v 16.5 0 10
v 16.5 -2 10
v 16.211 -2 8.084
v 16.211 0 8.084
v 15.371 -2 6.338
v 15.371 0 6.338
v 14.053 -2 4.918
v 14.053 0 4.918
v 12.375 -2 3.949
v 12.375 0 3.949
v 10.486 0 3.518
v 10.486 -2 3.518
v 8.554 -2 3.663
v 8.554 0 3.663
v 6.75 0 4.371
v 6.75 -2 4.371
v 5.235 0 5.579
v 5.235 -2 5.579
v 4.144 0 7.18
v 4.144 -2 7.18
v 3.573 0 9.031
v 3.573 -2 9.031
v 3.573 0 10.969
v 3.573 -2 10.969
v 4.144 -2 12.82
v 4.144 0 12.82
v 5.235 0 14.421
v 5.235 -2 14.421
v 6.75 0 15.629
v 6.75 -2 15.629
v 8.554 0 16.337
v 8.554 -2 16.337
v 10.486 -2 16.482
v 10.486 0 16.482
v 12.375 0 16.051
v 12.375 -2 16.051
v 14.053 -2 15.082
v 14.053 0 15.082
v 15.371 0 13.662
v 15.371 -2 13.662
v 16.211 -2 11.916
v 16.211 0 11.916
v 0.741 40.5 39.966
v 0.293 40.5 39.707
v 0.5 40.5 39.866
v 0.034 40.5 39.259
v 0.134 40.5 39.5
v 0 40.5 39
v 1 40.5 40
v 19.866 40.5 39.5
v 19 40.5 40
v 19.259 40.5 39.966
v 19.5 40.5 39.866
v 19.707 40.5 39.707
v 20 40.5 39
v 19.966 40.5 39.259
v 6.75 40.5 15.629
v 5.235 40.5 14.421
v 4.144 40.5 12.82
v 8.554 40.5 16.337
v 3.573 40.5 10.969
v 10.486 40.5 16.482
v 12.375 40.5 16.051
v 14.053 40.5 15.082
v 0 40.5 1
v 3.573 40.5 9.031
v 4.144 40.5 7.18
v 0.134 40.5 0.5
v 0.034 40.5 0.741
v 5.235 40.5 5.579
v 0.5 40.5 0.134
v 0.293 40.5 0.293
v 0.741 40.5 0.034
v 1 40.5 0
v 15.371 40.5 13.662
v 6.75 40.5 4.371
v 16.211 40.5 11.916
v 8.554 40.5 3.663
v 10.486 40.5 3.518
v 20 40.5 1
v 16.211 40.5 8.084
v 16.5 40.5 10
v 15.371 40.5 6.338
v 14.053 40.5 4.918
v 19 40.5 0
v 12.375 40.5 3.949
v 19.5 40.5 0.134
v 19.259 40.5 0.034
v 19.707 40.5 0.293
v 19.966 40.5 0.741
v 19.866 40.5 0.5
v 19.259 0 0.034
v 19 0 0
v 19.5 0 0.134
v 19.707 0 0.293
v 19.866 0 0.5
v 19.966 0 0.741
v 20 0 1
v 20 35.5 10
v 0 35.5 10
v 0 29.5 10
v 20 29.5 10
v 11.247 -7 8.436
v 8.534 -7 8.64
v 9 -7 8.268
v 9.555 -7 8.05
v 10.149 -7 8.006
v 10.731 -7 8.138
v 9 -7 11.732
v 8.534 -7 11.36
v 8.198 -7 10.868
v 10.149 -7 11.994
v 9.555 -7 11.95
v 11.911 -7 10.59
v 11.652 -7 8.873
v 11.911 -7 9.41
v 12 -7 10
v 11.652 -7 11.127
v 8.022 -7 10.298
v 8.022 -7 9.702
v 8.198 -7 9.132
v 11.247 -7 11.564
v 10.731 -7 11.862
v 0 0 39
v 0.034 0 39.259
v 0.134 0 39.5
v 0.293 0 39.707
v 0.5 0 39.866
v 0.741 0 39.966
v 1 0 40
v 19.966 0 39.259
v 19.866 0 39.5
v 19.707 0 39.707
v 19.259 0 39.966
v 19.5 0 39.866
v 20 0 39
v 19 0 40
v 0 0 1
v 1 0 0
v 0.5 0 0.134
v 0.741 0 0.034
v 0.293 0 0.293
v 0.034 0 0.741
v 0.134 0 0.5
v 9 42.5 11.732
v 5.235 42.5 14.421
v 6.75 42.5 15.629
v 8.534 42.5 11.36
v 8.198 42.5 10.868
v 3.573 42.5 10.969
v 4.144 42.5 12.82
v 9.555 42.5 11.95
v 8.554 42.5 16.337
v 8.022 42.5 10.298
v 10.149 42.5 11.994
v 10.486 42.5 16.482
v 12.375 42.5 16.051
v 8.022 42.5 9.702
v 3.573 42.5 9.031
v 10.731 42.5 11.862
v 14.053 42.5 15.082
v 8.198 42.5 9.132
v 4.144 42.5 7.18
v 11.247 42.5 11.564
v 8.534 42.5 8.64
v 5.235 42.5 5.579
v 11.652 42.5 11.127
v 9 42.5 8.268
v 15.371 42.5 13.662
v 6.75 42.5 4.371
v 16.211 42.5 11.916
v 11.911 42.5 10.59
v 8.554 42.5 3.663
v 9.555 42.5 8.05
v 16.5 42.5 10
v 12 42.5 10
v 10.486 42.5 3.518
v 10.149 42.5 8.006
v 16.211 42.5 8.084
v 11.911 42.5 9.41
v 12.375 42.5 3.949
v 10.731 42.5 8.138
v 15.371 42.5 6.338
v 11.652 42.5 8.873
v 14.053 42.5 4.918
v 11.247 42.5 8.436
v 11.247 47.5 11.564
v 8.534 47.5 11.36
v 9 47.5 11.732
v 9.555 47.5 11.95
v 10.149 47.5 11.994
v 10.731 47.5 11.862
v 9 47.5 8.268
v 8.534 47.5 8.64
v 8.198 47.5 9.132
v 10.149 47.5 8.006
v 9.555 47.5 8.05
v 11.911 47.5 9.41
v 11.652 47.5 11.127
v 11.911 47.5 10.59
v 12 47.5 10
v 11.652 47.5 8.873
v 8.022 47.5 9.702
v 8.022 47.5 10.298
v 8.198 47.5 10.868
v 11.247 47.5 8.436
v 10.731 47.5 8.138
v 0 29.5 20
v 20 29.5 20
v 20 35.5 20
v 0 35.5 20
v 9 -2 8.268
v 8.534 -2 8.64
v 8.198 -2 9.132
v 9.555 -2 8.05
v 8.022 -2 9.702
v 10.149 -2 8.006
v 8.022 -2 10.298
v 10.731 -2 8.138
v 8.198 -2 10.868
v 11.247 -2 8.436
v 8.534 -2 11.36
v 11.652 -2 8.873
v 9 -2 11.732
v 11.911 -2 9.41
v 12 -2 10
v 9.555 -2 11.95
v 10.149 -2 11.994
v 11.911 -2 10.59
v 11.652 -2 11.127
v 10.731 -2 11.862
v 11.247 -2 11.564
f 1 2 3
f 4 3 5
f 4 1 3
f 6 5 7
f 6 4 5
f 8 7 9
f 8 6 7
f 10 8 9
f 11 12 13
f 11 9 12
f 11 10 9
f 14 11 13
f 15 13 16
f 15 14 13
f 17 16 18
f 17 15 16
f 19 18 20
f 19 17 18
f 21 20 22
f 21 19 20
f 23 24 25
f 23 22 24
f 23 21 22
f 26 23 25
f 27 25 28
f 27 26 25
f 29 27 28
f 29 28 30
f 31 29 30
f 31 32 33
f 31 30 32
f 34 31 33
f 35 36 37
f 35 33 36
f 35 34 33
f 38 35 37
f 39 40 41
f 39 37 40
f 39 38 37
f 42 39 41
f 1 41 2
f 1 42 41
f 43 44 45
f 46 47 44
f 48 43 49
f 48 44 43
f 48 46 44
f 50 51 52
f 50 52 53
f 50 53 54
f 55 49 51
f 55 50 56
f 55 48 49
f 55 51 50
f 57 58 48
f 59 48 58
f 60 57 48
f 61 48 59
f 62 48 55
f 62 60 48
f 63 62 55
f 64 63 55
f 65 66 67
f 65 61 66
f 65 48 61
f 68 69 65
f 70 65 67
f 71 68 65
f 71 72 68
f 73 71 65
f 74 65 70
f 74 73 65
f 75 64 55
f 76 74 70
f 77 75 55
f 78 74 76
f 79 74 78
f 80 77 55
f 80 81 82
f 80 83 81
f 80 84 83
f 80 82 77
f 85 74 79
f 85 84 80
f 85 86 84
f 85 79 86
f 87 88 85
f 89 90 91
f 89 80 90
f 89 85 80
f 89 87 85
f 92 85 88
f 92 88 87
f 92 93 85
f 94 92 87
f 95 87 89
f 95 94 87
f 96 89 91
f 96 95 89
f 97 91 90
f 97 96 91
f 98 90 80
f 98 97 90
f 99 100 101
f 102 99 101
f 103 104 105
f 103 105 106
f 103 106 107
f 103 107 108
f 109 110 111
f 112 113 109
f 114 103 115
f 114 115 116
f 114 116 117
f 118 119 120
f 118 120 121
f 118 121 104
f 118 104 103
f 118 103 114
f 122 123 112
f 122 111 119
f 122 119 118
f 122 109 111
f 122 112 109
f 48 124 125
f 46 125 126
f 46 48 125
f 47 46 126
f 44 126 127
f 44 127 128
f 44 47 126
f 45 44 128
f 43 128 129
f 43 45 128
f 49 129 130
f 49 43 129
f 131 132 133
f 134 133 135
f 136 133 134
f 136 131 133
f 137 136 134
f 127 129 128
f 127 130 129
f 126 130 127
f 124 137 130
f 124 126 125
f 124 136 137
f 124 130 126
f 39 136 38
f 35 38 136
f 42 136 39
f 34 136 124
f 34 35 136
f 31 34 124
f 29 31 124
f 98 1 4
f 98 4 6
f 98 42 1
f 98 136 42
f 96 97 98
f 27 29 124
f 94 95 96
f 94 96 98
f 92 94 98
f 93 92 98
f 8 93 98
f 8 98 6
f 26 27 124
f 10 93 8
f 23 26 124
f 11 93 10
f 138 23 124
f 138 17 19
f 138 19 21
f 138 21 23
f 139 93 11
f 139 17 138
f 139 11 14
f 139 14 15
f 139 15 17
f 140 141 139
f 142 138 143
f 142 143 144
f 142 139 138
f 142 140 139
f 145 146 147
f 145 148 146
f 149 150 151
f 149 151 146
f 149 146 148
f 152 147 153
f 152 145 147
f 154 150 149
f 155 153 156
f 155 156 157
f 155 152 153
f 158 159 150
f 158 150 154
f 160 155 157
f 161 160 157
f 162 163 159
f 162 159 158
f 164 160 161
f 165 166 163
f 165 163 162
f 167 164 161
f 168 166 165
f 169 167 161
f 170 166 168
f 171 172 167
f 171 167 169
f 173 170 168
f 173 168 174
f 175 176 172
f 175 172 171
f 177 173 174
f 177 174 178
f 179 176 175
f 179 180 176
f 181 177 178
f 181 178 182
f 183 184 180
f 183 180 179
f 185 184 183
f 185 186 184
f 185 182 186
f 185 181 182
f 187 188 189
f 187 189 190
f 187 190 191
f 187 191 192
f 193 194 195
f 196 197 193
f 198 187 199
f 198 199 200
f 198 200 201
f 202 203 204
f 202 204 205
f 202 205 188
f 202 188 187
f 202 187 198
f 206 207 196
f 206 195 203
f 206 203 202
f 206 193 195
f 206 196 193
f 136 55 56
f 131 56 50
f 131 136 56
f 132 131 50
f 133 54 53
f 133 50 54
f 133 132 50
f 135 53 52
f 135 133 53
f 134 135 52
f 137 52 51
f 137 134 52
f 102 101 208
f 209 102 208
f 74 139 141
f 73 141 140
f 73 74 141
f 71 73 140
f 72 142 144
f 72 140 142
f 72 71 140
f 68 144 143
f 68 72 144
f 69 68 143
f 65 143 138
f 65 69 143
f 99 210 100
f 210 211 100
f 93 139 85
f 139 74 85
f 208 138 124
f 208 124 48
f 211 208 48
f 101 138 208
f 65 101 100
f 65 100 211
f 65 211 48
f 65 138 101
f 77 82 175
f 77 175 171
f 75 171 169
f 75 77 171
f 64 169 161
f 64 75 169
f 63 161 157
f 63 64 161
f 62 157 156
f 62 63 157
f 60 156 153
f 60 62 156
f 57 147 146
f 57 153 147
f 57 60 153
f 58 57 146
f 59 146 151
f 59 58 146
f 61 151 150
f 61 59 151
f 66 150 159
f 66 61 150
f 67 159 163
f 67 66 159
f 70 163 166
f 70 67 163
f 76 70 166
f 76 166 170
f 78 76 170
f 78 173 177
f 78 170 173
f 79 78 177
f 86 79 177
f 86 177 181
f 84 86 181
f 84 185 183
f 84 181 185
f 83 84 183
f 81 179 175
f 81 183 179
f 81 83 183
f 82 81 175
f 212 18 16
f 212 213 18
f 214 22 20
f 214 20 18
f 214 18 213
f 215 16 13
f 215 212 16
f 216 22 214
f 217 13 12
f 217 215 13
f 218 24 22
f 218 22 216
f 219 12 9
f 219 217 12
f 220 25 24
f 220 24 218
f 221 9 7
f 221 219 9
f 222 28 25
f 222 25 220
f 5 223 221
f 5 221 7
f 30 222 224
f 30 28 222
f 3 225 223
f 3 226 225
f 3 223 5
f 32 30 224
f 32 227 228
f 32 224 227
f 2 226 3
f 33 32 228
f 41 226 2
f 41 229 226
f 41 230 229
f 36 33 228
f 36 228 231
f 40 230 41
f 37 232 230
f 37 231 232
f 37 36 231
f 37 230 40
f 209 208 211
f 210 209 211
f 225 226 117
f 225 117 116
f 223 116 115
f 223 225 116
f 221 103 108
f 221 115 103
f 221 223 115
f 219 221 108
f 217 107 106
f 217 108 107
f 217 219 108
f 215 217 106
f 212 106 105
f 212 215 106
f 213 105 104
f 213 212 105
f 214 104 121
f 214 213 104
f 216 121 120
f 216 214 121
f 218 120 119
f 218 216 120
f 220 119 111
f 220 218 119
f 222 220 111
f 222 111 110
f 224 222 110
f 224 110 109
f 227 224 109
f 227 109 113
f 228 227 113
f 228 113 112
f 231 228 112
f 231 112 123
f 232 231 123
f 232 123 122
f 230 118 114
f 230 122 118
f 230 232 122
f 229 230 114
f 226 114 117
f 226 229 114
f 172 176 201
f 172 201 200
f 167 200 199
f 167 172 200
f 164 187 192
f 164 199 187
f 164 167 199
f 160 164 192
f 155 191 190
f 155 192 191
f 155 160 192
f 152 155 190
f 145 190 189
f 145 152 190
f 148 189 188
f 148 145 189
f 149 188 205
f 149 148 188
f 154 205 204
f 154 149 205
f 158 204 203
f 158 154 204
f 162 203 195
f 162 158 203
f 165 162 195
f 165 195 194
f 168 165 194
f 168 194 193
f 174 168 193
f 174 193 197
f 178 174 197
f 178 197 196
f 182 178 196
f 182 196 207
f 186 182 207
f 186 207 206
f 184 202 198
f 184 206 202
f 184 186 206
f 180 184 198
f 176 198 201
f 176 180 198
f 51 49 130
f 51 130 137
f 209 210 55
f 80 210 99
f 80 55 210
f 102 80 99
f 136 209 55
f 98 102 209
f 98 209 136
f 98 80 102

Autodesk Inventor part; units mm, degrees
ref_plane "YZ Plane" through (0, 0, 0) normal (1, 0, 0) x (0, 1, 0)
ref_plane "XZ Plane" through (0, 0, 0) normal (0, 1, 0) x (-1, 0, 0)
ref_plane "XY Plane" through (0, 0, 0) normal (0, 0, 1) x (1, 0, 0)
sketch "Sketch1" plane through (0, 0, 0) normal (0, 0, 1) x (1, 0, 0)
  line L0 (0, 0) -> (0, 40.5)
  line L1 (0, 40.5) -> (20, 40.5)
  line L2 (20, 40.5) -> (20, 0)
  line L3 (20, 0) -> (0, 0)
  dimension "d0" = 40.5
  dimension "d1" = 20
extrude "Extrusion1" add sketch "Sketch1" along normal blind 40
sketch "Sketch2" plane through (0, 40.5, 0) normal (0, 1, 0) x (1, 0, 0)
  line L0 (20, 0) -> (0, 0) projected
  line L1 (10, 0) -> (10, -10)
  circle A0 centre (10, -10) radius 5
  dimension "d4" = 10
  dimension "d5" = 10
extrude "Extrusion2" add sketch "Sketch2" along normal blind 1
sketch "Sketch3" plane through (10, 41.5, 10) normal (0, 1, 0) x (1, 0, 0)
  circle A0 centre (0, 0) radius 2
  point P0 (-10, 10)
  dimension "d8" = 4
extrude "Extrusion3" add sketch "Sketch3" along normal blind 6
fillet "Fillet1" radius 1 4 edges at (0, 20.25, 40) (20, 20.25, 40) (20, 20.25, 0) (0, 20.25, 0)
sketch "Sketch4" plane through (1, 0, 0) normal (0, -1, 0) x (1, 0, 0)
  line L0 (18, 0) -> (0, 0) projected
  line L1 (9, 0) -> (9, 10)
  circle A0 centre (9, 10) radius 5
  point P0 (-1, 0)
  dimension "d12" = 10
  dimension "d13" = 10
extrude "Extrusion4" add sketch "Sketch4" along normal blind 1
sketch "Sketch5" plane through (10, -1, 10) normal (0, -1, 0) x (1, 0, 0)
  circle A0 centre (0, 0) radius 2
  point P0 (-10, -10)
  dimension "d16" = 4
extrude "Extrusion5" add sketch "Sketch5" along normal blind 6
sketch "Boceto6" plane through (0, 0, 1) normal (-1, 0, 0) x (0, 0, 1)
  line L0 (-1, 0) -> (-1, 40.5) projected
  line L1 (-1, 40.5) -> (-1, 35.5)
  line L2 (-1, 35.5) -> (9, 35.5)
  line L3 (9, 35.5) -> (9, 29.5)
  line L4 (9, 29.5) -> (19, 29.5)
  line L5 (19, 29.5) -> (19, 35.5)
  line L6 (19, 35.5) -> (9, 35.5)
  dimension "d19" = 5
  dimension "d20" = 10
  dimension "d21" = 6
  dimension "d22" = 10
extrude "Extrusión6" cut sketch "Boceto6" against normal up to next
sketch "Boceto7" plane through (1, 0, 0) normal (0, -1, 0) x (1, 0, 0)
  line L0 (-1, 10) -> (19, 10) projected
  circle A0 centre (9, 10) radius 6.5
  circle A1 centre (9, 10) radius 2
  point P0 (-1, 0)
  dimension "d25" = 13
extrude "Extrusión8" add sketch "Boceto7" along normal blind 2 contours A1 L0 A0 | L0 A0 A1
sketch "Boceto8" plane through (1, 40.5, 0) normal (0, 1, 0) x (1, 0, 0)
  circle A0 centre (9, -10) radius 2 projected
  circle A1 centre (9, -10) radius 6.5
  circle A2 centre (9, -10) radius 6.5 projected
  circle A3 centre (9, -10) radius 2
  point P0 (-1, 0)
  dimension "d30" = 13
extrude "Extrusión9" add sketch "Boceto8" along normal blind 2
properties part number "servo_FT_SC"
